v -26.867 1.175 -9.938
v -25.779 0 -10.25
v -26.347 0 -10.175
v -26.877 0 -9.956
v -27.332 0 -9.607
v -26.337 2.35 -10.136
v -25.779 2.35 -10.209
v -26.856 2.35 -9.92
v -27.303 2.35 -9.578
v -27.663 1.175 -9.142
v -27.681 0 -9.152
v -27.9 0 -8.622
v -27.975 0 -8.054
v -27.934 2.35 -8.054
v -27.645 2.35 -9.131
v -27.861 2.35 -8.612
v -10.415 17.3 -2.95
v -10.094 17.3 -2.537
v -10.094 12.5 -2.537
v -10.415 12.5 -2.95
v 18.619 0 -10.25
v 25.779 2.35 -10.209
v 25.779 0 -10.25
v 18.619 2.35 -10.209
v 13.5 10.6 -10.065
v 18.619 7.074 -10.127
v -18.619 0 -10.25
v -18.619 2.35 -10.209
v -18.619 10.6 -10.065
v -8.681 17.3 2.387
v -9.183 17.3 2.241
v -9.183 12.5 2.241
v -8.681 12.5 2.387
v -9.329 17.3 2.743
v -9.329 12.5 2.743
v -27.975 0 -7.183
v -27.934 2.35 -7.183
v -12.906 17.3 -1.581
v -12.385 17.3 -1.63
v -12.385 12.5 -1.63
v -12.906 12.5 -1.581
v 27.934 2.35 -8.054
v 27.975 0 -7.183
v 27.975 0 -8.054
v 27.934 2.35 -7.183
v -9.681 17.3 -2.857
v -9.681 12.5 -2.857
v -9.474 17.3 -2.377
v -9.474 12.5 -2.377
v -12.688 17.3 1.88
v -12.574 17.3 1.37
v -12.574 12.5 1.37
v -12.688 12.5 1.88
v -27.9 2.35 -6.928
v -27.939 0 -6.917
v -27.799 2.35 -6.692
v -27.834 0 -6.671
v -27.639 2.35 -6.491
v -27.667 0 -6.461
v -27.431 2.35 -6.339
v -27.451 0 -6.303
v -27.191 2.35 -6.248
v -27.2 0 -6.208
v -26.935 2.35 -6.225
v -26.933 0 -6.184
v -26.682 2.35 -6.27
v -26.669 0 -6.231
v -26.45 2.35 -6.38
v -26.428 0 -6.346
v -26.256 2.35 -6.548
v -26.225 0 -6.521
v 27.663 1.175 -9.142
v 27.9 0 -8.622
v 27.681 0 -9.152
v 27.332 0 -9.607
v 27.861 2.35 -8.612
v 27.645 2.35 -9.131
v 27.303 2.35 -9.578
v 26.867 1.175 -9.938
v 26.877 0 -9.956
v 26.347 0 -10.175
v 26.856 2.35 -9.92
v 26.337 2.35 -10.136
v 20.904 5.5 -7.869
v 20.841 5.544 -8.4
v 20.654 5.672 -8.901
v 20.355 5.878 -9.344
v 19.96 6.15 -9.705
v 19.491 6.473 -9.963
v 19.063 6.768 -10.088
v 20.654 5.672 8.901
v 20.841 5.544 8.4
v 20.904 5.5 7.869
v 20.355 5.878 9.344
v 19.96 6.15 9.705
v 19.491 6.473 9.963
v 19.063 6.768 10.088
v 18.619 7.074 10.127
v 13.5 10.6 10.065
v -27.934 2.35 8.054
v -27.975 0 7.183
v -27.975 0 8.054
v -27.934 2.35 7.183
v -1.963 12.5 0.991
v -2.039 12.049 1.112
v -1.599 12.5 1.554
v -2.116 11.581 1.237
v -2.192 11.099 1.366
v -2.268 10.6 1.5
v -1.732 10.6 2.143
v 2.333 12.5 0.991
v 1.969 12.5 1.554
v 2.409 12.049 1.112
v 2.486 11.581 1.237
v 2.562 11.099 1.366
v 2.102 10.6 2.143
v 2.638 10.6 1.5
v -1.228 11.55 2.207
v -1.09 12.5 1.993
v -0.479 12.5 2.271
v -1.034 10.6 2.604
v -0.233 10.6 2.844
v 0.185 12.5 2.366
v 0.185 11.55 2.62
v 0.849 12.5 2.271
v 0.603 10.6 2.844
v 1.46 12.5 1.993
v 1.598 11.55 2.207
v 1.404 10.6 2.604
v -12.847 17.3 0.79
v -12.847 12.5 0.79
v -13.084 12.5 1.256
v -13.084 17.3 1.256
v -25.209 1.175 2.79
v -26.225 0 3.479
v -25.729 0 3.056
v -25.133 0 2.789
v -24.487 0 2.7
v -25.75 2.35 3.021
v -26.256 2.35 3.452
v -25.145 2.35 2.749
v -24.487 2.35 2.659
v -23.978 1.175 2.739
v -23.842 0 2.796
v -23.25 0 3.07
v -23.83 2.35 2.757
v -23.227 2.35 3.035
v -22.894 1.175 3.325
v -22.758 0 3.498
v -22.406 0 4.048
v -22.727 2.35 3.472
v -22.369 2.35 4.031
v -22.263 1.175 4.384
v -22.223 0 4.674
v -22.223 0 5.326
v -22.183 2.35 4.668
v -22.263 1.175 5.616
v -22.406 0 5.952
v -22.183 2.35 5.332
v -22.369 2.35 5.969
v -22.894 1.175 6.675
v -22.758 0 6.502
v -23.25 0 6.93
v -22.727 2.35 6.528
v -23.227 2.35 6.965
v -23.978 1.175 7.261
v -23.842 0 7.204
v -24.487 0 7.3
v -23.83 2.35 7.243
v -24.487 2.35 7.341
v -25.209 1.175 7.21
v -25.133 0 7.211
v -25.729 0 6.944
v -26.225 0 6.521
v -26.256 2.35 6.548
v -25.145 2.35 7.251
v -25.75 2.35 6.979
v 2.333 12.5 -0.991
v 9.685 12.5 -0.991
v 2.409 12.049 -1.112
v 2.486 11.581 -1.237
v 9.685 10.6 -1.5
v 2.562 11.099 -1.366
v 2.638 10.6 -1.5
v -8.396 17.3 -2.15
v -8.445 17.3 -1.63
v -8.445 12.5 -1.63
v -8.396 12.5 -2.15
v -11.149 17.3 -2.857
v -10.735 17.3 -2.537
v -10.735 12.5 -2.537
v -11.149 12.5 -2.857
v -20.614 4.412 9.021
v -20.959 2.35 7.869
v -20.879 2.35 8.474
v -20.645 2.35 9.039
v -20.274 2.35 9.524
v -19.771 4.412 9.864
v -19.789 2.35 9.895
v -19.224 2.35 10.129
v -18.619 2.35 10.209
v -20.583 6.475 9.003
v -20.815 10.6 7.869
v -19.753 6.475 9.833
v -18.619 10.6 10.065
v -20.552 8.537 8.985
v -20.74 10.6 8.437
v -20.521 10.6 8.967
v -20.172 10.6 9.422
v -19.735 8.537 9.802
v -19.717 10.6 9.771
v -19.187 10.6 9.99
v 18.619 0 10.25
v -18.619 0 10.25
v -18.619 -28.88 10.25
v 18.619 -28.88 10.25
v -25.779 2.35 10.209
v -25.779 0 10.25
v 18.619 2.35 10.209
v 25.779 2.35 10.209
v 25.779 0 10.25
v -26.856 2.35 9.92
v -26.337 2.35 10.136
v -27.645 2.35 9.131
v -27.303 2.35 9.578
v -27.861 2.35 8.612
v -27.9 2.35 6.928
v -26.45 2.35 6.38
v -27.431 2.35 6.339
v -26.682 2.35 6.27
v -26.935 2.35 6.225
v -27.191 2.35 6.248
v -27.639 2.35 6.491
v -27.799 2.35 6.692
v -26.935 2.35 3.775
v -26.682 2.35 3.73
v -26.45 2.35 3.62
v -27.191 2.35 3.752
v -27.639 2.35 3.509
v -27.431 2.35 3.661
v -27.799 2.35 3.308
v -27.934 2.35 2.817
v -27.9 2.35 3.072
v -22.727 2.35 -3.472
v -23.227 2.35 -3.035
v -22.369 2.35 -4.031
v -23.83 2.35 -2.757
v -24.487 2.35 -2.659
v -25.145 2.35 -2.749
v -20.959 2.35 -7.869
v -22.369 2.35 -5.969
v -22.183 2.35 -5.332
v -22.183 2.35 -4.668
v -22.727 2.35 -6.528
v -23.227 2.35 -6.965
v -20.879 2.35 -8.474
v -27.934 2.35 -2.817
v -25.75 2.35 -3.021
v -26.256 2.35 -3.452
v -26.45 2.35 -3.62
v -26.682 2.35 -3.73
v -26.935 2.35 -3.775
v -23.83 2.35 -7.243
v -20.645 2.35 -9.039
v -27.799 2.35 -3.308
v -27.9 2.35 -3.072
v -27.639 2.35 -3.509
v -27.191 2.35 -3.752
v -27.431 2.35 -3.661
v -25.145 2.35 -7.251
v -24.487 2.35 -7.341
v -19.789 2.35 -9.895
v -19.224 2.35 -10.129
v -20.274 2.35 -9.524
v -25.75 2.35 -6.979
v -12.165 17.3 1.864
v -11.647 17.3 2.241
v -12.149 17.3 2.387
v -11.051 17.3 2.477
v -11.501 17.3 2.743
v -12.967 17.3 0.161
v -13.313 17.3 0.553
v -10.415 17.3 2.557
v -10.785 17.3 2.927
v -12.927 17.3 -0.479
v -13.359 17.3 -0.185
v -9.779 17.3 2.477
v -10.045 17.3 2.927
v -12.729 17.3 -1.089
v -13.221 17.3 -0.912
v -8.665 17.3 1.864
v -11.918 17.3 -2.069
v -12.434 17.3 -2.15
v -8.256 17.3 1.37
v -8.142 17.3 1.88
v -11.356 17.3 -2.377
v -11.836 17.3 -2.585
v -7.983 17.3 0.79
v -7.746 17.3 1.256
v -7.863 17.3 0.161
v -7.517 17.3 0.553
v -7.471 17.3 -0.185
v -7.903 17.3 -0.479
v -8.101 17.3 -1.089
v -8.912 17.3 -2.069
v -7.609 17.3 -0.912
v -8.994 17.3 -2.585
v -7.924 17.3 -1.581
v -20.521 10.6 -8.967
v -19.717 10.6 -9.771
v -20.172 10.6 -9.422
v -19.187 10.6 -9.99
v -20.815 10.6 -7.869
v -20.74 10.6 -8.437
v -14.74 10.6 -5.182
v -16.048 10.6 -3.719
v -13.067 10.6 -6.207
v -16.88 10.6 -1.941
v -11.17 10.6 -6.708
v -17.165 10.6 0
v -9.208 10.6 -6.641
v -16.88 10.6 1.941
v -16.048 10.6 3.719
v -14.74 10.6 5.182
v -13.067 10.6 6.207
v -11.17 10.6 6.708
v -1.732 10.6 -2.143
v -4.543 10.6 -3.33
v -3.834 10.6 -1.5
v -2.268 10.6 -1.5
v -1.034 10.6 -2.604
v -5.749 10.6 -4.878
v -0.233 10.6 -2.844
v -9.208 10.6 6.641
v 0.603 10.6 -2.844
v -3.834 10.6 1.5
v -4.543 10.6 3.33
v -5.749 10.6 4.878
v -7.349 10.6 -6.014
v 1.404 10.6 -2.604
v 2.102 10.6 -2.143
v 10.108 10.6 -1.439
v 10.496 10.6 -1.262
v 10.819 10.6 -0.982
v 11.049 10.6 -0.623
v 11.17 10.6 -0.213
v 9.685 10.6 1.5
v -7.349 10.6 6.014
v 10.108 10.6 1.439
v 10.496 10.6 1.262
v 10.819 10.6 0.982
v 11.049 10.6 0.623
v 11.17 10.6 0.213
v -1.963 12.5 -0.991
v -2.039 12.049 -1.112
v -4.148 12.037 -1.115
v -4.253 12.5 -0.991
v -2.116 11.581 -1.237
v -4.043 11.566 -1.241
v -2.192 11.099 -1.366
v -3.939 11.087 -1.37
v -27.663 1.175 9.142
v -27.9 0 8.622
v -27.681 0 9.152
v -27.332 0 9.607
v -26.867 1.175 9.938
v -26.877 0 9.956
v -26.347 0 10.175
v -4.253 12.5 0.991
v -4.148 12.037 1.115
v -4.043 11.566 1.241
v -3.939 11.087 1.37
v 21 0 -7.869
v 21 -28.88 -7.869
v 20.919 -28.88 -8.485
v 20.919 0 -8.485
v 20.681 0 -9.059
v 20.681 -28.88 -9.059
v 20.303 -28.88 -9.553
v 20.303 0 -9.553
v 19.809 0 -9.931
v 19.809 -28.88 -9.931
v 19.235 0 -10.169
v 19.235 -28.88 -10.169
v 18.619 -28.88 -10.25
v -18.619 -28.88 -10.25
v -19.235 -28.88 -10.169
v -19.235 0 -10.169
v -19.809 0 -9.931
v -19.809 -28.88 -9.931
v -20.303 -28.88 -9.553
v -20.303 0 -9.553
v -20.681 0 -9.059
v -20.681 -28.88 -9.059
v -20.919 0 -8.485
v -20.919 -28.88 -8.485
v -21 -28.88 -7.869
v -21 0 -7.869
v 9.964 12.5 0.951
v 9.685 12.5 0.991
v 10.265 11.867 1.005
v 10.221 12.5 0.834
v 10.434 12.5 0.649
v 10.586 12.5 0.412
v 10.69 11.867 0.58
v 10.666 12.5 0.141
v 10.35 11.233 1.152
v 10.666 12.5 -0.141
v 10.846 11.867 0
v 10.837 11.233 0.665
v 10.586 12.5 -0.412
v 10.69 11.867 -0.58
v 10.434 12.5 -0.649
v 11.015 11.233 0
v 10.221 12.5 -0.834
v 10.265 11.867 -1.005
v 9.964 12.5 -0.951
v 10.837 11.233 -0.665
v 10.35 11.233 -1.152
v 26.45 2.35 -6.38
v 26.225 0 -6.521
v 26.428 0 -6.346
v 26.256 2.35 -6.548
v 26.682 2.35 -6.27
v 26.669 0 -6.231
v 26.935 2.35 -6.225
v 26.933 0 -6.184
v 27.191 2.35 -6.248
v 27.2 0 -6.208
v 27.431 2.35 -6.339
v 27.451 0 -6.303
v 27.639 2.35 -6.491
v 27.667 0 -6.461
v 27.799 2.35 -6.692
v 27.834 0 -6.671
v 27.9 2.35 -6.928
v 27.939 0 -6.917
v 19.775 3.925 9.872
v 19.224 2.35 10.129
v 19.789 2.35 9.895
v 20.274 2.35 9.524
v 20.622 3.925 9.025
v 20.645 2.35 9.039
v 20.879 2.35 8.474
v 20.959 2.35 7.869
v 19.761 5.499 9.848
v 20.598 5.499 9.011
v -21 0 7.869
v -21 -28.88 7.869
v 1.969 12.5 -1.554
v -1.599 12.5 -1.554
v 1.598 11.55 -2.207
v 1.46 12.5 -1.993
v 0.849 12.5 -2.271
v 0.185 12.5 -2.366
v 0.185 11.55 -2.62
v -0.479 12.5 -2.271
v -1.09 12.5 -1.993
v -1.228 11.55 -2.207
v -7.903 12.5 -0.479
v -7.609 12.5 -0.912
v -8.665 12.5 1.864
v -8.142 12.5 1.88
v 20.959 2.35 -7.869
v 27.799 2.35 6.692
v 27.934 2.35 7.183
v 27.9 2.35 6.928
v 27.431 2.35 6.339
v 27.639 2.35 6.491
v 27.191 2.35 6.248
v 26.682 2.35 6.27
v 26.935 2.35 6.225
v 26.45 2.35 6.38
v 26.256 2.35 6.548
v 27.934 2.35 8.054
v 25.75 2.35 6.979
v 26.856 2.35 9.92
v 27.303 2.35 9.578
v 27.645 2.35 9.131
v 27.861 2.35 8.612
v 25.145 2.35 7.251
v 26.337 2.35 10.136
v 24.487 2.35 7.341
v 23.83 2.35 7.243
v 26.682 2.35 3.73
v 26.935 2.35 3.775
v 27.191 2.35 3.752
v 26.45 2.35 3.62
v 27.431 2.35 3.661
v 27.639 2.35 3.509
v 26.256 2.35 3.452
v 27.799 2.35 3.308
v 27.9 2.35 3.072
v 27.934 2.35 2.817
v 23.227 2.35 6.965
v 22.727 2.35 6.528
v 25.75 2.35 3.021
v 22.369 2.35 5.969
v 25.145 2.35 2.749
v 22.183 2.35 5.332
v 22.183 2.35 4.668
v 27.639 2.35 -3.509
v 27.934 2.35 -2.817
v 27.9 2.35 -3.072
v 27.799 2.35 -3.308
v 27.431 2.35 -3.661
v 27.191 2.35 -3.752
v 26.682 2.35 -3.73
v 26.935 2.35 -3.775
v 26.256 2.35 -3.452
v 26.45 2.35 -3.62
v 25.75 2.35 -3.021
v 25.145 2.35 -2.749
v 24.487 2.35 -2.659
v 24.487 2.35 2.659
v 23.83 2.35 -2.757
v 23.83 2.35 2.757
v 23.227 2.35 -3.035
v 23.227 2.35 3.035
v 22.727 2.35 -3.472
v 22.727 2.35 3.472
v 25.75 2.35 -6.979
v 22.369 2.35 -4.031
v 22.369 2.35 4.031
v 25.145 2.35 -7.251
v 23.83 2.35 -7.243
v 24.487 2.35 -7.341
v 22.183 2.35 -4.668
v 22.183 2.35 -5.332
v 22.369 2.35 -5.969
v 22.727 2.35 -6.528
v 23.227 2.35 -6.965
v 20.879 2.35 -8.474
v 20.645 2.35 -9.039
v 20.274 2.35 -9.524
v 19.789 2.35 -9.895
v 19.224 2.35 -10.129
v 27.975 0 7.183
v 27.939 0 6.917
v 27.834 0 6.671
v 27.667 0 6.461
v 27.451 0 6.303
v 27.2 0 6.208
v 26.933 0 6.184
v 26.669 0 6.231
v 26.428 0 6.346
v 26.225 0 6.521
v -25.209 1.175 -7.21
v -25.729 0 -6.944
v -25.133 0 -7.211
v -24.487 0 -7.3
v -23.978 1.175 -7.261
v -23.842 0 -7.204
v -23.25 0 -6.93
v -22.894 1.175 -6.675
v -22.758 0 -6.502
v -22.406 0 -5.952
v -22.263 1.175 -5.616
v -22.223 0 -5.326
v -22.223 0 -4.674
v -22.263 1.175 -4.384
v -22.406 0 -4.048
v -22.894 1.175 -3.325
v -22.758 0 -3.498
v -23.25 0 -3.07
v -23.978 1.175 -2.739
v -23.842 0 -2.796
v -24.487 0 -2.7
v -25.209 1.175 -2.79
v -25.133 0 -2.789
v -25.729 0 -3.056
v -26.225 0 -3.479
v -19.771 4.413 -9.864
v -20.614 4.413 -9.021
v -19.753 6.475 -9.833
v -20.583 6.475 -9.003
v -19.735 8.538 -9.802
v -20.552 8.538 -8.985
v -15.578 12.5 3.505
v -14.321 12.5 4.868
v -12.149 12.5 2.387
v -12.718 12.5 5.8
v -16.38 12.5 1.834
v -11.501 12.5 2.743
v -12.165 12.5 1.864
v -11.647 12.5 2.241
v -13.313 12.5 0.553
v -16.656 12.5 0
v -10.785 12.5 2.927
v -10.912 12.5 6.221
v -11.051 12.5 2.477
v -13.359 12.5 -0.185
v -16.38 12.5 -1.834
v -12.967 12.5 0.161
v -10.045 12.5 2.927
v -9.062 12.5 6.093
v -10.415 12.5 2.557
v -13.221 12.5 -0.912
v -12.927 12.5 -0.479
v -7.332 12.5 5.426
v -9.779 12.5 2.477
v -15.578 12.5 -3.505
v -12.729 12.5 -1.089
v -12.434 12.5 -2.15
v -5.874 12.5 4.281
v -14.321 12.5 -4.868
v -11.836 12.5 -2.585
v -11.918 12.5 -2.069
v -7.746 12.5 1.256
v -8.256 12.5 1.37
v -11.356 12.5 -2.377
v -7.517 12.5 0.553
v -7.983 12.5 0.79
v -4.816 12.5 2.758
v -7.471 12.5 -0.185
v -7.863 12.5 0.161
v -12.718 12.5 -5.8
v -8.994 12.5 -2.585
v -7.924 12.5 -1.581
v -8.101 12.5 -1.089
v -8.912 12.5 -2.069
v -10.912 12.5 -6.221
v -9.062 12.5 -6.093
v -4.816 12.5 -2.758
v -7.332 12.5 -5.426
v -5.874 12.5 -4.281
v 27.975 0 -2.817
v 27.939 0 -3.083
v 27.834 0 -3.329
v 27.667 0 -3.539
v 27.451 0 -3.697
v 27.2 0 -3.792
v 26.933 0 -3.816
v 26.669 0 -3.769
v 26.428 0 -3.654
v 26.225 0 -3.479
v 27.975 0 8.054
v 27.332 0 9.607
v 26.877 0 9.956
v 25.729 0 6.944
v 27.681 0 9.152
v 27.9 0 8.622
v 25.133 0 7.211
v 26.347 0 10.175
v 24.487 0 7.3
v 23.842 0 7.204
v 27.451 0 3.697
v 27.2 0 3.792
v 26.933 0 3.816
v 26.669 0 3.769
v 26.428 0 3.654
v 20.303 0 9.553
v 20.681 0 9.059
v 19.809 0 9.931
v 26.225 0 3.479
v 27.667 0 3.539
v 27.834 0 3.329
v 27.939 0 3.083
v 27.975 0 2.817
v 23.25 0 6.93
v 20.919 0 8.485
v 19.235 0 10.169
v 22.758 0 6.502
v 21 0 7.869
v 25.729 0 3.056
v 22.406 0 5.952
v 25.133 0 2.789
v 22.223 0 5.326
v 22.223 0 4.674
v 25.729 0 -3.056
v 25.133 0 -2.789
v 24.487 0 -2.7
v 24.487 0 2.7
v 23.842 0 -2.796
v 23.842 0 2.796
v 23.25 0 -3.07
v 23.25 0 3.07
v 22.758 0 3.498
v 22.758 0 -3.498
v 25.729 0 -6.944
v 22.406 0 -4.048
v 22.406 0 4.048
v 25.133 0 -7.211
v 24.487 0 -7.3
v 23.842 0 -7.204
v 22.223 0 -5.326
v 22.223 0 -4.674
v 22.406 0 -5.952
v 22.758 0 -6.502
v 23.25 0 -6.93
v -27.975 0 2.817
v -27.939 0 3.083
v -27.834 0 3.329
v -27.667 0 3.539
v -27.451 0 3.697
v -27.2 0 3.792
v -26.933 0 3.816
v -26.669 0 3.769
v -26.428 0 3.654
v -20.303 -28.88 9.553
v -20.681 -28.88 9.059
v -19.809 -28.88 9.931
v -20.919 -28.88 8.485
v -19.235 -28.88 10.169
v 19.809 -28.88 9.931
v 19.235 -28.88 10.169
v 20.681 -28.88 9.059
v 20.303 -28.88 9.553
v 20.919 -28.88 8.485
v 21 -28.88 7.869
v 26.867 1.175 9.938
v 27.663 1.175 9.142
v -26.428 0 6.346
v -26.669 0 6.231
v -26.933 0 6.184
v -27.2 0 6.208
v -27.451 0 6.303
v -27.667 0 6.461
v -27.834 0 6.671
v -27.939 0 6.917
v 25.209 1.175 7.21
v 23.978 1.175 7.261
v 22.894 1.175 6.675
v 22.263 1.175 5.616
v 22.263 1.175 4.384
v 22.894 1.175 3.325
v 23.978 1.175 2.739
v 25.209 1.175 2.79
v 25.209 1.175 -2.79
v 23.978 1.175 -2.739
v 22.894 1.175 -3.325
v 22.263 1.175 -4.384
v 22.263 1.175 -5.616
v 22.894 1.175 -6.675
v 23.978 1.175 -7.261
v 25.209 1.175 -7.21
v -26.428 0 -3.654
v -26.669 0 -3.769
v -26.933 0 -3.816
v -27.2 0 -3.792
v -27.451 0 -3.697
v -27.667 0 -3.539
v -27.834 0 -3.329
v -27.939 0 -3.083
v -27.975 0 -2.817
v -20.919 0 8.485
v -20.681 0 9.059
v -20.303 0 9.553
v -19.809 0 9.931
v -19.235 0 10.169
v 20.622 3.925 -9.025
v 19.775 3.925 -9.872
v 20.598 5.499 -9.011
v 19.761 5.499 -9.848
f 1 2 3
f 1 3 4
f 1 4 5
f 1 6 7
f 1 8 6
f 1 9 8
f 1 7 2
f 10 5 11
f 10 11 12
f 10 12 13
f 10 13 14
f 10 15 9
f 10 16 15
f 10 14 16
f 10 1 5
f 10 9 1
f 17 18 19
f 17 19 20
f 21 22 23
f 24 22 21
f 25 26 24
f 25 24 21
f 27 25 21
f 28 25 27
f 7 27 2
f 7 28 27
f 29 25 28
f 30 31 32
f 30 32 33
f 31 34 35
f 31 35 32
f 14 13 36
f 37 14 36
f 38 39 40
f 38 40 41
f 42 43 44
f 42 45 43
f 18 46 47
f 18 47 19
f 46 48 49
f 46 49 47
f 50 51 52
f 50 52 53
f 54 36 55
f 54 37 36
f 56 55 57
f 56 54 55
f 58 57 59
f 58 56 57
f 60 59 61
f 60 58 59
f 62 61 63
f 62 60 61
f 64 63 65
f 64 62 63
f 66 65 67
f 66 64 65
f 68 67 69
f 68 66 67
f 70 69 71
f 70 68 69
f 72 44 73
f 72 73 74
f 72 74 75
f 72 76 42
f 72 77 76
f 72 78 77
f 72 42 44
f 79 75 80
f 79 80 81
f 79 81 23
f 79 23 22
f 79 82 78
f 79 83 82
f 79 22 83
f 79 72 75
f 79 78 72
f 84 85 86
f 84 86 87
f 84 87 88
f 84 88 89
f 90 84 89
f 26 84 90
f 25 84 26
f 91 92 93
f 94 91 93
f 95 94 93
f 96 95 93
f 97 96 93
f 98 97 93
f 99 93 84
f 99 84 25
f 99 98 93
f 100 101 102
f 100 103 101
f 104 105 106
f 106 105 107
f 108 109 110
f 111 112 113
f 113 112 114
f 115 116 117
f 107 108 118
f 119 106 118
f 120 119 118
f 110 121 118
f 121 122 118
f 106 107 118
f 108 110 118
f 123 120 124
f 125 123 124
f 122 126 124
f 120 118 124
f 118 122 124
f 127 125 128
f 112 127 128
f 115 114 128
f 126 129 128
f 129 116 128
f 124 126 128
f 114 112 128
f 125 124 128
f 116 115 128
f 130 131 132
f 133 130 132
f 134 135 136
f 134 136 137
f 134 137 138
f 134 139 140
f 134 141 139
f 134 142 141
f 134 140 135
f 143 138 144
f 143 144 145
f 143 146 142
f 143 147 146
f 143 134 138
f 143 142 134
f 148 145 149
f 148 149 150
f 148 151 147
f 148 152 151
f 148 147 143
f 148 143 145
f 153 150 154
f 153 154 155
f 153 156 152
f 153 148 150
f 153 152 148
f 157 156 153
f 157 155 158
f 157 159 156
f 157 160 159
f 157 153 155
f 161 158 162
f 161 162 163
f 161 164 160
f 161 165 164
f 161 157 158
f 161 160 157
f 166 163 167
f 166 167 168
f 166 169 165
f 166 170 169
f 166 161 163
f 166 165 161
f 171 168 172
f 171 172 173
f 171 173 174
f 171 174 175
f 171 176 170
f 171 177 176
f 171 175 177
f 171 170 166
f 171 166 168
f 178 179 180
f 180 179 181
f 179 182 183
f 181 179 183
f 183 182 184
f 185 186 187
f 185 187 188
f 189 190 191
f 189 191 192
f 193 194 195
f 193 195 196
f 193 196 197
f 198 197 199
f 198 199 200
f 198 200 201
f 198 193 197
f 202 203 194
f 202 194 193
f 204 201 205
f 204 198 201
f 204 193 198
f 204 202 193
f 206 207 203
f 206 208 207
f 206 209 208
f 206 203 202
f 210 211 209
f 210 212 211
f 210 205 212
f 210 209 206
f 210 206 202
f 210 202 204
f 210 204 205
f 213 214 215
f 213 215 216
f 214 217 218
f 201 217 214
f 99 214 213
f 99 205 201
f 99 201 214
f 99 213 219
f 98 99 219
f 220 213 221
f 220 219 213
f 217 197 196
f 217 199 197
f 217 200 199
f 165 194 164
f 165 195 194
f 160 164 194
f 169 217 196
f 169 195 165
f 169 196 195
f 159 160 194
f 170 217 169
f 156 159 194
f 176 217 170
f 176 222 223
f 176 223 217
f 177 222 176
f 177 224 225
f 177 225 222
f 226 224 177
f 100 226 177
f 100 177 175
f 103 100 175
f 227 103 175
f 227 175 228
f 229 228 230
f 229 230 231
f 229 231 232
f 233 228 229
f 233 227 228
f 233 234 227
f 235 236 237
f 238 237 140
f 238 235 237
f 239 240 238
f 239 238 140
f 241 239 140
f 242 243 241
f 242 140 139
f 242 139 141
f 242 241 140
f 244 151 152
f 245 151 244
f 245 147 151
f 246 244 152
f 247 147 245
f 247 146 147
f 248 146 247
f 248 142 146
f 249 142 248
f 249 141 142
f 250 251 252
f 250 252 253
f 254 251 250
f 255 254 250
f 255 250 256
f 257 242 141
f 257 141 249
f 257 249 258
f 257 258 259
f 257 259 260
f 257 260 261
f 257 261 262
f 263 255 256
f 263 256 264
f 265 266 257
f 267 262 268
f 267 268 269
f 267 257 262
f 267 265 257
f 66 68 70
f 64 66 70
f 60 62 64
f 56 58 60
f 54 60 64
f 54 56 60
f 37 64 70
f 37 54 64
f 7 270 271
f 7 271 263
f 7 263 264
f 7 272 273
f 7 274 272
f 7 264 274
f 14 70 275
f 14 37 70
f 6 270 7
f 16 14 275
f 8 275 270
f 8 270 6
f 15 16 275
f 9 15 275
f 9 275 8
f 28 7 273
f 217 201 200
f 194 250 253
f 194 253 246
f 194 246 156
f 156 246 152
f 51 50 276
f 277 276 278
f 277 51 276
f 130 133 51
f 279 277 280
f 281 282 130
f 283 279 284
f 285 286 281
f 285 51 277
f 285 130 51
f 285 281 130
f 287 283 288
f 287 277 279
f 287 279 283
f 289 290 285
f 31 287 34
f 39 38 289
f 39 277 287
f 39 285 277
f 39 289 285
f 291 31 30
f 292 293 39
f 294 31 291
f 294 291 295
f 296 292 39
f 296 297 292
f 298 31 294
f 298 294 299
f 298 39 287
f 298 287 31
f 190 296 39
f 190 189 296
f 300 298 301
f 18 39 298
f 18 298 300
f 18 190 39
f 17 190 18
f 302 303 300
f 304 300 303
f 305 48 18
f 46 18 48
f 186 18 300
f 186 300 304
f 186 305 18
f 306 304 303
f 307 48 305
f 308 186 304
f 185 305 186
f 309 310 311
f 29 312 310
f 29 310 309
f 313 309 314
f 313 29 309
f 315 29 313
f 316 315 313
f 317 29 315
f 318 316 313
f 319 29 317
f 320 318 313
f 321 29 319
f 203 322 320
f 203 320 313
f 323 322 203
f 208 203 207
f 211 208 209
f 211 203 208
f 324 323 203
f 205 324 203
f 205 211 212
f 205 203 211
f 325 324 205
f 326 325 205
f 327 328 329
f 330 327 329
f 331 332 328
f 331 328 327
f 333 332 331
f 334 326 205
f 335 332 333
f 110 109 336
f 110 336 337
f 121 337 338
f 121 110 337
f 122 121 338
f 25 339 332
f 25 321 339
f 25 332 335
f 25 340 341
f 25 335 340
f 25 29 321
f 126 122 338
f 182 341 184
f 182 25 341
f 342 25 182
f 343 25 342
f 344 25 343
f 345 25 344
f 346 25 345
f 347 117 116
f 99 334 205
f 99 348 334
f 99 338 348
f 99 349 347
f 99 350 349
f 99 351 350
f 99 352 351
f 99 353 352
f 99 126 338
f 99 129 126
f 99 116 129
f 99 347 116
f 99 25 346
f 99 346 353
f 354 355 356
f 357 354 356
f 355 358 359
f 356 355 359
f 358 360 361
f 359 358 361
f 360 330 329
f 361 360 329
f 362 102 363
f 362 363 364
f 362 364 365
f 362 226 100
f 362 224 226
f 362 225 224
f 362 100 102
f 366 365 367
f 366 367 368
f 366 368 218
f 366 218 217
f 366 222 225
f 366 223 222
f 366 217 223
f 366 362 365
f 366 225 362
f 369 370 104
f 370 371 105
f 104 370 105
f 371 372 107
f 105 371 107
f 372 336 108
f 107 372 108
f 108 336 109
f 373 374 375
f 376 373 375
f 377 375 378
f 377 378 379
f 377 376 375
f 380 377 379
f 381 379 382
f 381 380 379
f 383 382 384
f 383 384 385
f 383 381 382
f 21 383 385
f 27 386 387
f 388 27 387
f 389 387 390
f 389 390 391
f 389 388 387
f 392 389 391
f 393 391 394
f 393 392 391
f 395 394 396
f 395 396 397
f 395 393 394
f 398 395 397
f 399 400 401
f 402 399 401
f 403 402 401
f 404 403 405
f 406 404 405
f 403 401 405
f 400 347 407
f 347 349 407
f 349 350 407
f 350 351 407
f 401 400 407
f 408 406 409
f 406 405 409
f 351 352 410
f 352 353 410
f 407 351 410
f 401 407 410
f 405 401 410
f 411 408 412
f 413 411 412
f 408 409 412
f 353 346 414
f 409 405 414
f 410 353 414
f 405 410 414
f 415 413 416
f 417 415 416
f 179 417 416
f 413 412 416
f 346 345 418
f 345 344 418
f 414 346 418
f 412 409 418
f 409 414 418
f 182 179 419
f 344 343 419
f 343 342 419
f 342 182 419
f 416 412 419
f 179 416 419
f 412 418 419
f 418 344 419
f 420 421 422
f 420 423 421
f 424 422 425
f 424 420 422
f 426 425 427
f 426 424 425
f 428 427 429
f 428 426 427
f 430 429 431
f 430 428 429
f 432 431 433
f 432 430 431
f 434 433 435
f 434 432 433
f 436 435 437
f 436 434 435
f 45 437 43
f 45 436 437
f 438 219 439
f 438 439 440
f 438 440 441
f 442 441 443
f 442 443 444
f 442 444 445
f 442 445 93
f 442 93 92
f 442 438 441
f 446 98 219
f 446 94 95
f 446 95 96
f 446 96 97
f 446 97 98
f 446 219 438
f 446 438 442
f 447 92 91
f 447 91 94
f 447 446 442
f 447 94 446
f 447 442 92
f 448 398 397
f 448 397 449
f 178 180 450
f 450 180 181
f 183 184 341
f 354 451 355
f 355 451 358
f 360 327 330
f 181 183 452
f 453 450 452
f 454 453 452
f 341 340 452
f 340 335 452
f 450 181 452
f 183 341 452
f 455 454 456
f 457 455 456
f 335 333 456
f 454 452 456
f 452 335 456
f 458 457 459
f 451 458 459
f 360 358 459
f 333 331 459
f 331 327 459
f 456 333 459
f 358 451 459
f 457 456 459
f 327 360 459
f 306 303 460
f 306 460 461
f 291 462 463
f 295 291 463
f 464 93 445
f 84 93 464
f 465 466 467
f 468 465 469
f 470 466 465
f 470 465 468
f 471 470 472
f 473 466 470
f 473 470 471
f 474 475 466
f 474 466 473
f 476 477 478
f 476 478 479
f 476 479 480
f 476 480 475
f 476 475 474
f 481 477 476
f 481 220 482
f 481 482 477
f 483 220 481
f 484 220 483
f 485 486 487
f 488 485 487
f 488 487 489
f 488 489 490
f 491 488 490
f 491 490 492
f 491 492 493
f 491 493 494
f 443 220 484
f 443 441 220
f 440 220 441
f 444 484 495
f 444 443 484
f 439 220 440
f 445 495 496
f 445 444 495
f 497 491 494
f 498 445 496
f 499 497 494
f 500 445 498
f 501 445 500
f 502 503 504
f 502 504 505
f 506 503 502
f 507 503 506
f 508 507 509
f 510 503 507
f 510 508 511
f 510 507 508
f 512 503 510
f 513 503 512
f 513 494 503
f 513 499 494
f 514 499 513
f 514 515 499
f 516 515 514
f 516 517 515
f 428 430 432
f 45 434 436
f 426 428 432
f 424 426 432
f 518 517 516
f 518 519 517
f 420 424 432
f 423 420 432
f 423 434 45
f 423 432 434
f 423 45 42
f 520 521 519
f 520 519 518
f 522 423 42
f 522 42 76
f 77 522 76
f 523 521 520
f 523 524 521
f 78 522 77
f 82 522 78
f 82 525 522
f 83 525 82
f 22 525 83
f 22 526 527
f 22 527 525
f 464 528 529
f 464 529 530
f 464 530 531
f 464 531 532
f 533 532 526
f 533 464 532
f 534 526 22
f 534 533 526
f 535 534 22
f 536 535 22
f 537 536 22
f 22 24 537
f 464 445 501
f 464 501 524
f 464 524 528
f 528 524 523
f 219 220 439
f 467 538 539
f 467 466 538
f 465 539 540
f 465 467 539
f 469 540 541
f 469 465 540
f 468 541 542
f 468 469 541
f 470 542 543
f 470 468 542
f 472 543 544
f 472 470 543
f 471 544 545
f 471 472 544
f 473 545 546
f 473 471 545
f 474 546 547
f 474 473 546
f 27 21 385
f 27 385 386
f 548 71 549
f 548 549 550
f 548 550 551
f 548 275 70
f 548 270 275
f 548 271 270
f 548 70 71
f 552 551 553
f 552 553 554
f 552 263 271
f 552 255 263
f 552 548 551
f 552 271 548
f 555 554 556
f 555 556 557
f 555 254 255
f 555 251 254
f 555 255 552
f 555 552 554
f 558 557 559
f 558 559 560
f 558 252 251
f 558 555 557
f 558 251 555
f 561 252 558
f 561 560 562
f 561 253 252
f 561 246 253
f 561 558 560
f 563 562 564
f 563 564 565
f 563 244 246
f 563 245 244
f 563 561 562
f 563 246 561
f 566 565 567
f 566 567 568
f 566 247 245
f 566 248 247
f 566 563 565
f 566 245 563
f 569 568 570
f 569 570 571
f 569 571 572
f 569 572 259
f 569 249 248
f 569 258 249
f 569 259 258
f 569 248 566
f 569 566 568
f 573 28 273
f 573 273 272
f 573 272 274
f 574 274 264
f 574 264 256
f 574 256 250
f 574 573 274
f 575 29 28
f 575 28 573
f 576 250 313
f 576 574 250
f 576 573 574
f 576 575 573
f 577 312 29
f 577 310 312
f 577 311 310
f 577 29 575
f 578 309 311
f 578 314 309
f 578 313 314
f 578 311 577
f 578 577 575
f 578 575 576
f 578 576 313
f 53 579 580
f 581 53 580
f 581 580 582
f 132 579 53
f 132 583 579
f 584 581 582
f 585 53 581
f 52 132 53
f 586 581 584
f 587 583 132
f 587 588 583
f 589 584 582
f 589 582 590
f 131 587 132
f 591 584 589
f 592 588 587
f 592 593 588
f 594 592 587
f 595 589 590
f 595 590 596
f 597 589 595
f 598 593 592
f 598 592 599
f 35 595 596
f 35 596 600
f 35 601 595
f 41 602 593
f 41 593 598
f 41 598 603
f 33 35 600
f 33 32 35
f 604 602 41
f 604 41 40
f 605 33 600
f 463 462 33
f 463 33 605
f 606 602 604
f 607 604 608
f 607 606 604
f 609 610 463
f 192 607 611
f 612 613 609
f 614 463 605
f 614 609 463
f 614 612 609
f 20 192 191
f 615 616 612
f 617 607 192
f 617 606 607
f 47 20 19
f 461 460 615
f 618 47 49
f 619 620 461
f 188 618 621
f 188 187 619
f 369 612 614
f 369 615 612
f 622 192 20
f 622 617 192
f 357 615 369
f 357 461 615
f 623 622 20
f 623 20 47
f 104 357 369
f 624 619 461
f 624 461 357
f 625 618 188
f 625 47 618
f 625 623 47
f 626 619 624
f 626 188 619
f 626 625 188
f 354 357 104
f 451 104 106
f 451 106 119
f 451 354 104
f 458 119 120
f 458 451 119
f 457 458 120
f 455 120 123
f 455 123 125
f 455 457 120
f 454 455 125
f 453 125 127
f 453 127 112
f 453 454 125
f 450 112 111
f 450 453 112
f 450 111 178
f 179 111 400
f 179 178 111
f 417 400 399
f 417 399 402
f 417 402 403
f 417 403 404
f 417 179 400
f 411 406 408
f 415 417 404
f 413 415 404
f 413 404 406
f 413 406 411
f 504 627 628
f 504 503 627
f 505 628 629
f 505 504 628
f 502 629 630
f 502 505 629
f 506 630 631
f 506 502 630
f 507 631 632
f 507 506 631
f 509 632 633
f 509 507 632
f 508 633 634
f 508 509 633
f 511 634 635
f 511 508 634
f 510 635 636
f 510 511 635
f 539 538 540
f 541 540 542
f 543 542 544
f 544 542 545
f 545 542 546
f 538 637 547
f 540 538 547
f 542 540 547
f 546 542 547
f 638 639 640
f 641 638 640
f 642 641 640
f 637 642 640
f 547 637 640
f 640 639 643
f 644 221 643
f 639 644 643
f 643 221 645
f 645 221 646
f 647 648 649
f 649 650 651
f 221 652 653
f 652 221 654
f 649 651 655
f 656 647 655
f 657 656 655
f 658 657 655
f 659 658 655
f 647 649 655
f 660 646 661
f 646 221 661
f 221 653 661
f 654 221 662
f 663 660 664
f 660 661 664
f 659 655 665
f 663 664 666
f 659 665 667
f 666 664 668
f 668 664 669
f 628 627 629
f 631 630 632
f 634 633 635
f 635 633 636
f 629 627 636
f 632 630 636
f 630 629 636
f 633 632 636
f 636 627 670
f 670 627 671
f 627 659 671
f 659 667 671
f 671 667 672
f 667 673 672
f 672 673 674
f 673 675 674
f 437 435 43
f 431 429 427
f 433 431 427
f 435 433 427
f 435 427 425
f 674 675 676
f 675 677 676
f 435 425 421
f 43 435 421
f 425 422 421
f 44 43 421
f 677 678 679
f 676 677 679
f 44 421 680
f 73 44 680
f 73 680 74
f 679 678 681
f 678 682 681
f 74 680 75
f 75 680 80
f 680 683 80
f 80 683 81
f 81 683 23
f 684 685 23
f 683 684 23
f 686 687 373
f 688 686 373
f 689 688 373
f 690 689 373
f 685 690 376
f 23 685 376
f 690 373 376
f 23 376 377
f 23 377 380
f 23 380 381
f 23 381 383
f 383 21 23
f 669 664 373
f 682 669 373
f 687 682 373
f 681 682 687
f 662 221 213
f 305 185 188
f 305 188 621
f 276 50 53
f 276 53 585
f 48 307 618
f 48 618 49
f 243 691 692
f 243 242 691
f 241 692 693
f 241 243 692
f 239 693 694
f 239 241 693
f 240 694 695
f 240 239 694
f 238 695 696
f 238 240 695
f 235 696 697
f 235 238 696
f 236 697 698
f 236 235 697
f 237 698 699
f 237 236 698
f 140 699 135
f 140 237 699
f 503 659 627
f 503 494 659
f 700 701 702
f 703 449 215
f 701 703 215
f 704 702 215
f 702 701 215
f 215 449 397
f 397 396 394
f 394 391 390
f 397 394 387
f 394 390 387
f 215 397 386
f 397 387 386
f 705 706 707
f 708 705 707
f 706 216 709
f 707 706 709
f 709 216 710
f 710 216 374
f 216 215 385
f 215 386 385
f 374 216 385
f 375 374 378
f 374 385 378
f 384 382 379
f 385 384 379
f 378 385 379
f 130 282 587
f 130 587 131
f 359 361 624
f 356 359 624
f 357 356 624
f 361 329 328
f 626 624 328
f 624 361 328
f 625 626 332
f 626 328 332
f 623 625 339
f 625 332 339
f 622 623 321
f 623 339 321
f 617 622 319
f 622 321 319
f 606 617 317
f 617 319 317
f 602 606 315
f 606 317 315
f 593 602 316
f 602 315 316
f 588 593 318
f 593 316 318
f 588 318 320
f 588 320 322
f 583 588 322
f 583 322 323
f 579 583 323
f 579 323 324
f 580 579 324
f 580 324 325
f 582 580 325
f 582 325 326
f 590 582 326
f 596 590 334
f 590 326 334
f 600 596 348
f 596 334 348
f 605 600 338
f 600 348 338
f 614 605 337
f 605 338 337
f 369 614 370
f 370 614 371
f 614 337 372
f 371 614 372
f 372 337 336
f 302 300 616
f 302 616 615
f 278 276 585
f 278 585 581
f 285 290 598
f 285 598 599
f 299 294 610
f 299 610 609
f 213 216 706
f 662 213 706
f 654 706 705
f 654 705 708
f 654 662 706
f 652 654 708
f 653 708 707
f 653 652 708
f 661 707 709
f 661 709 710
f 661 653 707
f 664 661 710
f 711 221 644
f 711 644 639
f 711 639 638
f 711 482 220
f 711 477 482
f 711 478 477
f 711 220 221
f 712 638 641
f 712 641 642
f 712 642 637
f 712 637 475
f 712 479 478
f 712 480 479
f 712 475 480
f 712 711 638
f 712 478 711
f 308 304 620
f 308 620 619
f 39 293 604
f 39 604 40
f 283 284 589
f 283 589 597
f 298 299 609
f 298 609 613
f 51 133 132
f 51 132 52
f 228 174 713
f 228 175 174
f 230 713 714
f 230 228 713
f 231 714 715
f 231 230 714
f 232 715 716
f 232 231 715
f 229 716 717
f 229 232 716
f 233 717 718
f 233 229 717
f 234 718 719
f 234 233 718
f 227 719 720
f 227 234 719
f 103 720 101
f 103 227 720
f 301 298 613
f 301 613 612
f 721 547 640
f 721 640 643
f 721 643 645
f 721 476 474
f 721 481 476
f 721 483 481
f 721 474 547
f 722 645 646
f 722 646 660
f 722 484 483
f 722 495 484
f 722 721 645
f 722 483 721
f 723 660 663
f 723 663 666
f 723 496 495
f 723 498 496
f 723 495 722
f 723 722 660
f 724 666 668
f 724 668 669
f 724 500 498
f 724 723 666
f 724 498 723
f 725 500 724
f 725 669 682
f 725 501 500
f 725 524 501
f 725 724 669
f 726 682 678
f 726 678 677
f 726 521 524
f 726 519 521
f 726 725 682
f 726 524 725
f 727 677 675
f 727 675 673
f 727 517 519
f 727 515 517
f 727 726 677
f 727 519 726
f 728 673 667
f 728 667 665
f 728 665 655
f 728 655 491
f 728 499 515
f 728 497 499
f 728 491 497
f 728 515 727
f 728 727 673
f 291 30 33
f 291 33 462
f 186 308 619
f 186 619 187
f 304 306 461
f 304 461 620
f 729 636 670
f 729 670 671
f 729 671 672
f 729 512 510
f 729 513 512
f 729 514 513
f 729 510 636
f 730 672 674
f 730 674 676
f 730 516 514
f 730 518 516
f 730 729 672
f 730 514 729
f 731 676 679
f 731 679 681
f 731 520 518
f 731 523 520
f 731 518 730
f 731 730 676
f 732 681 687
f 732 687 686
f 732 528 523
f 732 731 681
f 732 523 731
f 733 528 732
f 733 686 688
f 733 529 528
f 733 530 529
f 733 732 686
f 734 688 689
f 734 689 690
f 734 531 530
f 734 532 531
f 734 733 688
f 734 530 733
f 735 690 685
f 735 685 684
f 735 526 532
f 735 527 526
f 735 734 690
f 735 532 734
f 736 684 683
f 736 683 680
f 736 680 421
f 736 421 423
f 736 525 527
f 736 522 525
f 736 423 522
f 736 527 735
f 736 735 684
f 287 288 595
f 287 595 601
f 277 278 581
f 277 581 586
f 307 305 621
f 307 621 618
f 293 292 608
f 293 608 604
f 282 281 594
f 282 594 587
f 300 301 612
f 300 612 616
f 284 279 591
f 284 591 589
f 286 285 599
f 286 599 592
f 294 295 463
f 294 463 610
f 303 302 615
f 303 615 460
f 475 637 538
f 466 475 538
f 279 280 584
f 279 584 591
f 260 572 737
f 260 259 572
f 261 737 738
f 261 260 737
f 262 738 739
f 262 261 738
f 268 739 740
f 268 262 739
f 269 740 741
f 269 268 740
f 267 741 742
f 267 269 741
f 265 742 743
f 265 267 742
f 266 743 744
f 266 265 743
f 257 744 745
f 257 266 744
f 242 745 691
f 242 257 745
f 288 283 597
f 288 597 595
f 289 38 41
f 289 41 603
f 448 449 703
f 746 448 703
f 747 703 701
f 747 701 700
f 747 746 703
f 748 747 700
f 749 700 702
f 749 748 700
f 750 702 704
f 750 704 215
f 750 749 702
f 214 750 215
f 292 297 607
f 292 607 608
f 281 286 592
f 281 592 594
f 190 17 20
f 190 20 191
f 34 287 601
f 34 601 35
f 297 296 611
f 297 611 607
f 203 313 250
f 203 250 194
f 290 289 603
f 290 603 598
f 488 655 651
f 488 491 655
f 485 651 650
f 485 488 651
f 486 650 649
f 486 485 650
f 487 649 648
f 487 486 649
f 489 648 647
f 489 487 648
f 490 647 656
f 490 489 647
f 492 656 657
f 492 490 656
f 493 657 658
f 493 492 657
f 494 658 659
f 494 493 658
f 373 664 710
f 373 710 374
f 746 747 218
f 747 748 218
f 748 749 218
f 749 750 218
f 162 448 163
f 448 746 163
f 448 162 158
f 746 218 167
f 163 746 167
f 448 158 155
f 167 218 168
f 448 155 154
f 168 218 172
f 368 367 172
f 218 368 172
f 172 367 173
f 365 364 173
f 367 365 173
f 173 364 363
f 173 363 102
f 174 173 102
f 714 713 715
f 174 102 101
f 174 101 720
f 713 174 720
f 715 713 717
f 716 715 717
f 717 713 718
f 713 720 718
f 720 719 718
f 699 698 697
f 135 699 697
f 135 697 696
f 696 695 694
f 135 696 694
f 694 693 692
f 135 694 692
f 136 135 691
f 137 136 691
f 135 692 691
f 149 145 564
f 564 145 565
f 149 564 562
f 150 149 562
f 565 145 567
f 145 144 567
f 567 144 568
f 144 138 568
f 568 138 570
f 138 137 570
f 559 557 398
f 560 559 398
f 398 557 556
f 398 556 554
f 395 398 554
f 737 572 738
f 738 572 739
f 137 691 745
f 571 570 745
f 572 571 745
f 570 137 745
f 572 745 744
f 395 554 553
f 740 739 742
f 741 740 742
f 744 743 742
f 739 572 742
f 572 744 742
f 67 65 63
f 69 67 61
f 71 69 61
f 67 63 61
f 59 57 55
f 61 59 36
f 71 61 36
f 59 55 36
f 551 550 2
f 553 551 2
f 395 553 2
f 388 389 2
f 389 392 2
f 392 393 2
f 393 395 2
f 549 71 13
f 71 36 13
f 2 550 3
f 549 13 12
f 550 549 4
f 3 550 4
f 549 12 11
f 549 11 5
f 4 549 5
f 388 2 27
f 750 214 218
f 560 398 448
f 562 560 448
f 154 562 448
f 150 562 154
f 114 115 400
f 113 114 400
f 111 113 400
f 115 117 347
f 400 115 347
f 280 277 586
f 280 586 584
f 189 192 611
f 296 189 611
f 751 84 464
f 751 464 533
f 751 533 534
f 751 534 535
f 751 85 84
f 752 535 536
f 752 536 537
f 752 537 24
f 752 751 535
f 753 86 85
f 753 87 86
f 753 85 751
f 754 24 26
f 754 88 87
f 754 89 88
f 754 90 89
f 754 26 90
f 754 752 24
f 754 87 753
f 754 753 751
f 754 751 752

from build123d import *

# Parameters (mm, degrees)
BOSS_EXTRUDE1_DEPTH     = 28.88
BOSS_EXTRUDE2_DEPTH     = 10.6
BOSS_EXTRUDE2_TAPER     = 1
BOSS_EXTRUDE3_DEPTH     = 2.35
BOSS_EXTRUDE3_TAPER     = 1
CUT_EXTRUDE1_DEPTH      = 42.493584235
CUT_EXTRUDE1_DEPTH_BACK = 42.493584235
BOSS_EXTRUDE4_DEPTH     = 1.9
BOSS_EXTRUDE4_DRAFT     = 15
SKETCH5_R               = 2.95
BOSS_EXTRUDE5_DEPTH     = 4.8
SKETCH6_OUTSIDE_W       = 73.028
SKETCH6_OUTSIDE_H       = 37.578
CUT_EXTRUDE2_DEPTH      = 4.8


with BuildPart() as part:
    # Sketch1 → Boss-Extrude1 (new body)
    with BuildSketch(Plane(origin=(0, 0, 0), x_dir=(1, 0, 0), z_dir=(0, 1, 0))):
        with BuildLine():
            Line((-18.61875, -10.25), (18.61875, -10.25))
            ThreePointArc((18.61875, -10.25), (20.302548023, -9.552548023), (21, -7.86875))
            Line((21, -7.86875), (21, 7.86875))
            ThreePointArc((21, 7.86875), (20.302548023, 9.552548023), (18.61875, 10.25))
            Line((18.61875, 10.25), (-18.61875, 10.25))
            ThreePointArc((-18.61875, 10.25), (-20.302548023, 9.552548023), (-21, 7.86875))
            Line((-21, 7.86875), (-21, -7.86875))
            ThreePointArc((-21, -7.86875), (-20.302548023, -9.552548023), (-18.61875, -10.25))
        make_face()
    extrude(amount=-BOSS_EXTRUDE1_DEPTH)

    # Sketch1<2> → Boss-Extrude2 (add)
    with BuildSketch(Plane(origin=(0, 0, 0), x_dir=(1, 0, 0), z_dir=(0, 1, 0))):
        with BuildLine():
            Line((-18.61875, -10.25), (18.61875, -10.25))
            ThreePointArc((18.61875, -10.25), (20.302548023, -9.552548023), (21, -7.86875))
            Line((21, -7.86875), (21, 7.86875))
            ThreePointArc((21, 7.86875), (20.302548023, 9.552548023), (18.61875, 10.25))
            Line((18.61875, 10.25), (-18.61875, 10.25))
            ThreePointArc((-18.61875, 10.25), (-20.302548023, 9.552548023), (-21, 7.86875))
            Line((-21, 7.86875), (-21, -7.86875))
            ThreePointArc((-21, -7.86875), (-20.302548023, -9.552548023), (-18.61875, -10.25))
        make_face()
    extrude(amount=BOSS_EXTRUDE2_DEPTH, taper=BOSS_EXTRUDE2_TAPER)

    # Sketch2 → Boss-Extrude3 (add)
    with BuildSketch(Plane(origin=(0, 0, 0), x_dir=(1, 0, 0), z_dir=(0, 1, 0))):
        with BuildLine():
            ThreePointArc((-25.778773688, 10.25), (-27.331740206, 9.606740206), (-27.975, 8.053773688))
            Line((-27.975, 8.053773688), (-27.975, 7.182744832))
            ThreePointArc((-27.975, 7.182744832), (-27.328553391, 6.247330485), (-26.225, 6.521307004))
            ThreePointArc((-26.225, 6.521307004), (-22.2, 5), (-26.225, 3.478692996))
            ThreePointArc((-26.225, 3.478692996), (-27.328553391, 3.752669515), (-27.975, 2.817255168))
            Line((-27.975, 2.817255168), (-27.975, -2.817255168))
            ThreePointArc((-27.975, -2.817255168), (-27.328553391, -3.752669515), (-26.225, -3.478692996))
            ThreePointArc((-26.225, -3.478692996), (-22.2, -5), (-26.225, -6.521307004))
            ThreePointArc((-26.225, -6.521307004), (-27.328553391, -6.247330485), (-27.975, -7.182744832))
            Line((-27.975, -7.182744832), (-27.975, -8.053773688))
            ThreePointArc((-27.975, -8.053773688), (-27.331740206, -9.606740206), (-25.778773688, -10.25))
            Line((-25.778773688, -10.25), (25.778773688, -10.25))
            ThreePointArc((25.778773688, -10.25), (27.331740206, -9.606740206), (27.975, -8.053773688))
            Line((27.975, -8.053773688), (27.975, -7.182744832))
            ThreePointArc((27.975, -7.182744832), (27.328553391, -6.247330485), (26.225, -6.521307004))
            ThreePointArc((26.225, -6.521307004), (22.2, -5), (26.225, -3.478692996))
            ThreePointArc((26.225, -3.478692996), (27.328553391, -3.752669515), (27.975, -2.817255168))
            Line((27.975, -2.817255168), (27.975, 2.817255168))
            ThreePointArc((27.975, 2.817255168), (27.328553391, 3.752669515), (26.225, 3.478692996))
            ThreePointArc((26.225, 3.478692996), (22.2, 5), (26.225, 6.521307004))
            ThreePointArc((26.225, 6.521307004), (27.328553391, 6.247330485), (27.975, 7.182744832))
            Line((27.975, 7.182744832), (27.975, 8.053773688))
            ThreePointArc((27.975, 8.053773688), (27.331740206, 9.606740206), (25.778773688, 10.25))
            Line((25.778773688, 10.25), (-25.778773688, 10.25))
        make_face()
    extrude(amount=BOSS_EXTRUDE3_DEPTH, taper=BOSS_EXTRUDE3_TAPER)

    # Sketch3 → Cut-Extrude1 (cut, two sides: drawn at the far end of the back side and taken through both)
    with BuildSketch(Plane.XY.offset(-CUT_EXTRUDE1_DEPTH_BACK)):
        Polygon((20.903997143, 5.5), (13.5, 10.6), (20.814976312, 10.6), align=None)
    extrude(amount=CUT_EXTRUDE1_DEPTH + CUT_EXTRUDE1_DEPTH_BACK, mode=Mode.SUBTRACT)


with BuildPart() as boss_extrude4_tool:
    # Sketch4 → Boss-Extrude4 (with draft: the straight prism first)
    with BuildSketch(Plane(origin=(0, 10.6, 0), x_dir=(1, 0, 0), z_dir=(0, 1, 0))):
        with BuildLine():
            Line((-3.833753021, -1.5), (-2.267653421, -1.5))
            ThreePointArc((-2.267653421, -1.5), (0.185023688, -2.875), (2.637700797, -1.5))
            Line((2.637700797, -1.5), (9.685023688, -1.5))
            ThreePointArc((9.685023688, -1.5), (11.185023688, 0), (9.685023688, 1.5))
            Line((9.685023688, 1.5), (2.637700797, 1.5))
            ThreePointArc((2.637700797, 1.5), (0.185023688, 2.875), (-2.267653421, 1.5))
            Line((-2.267653421, 1.5), (-3.833753021, 1.5))
            ThreePointArc((-3.833753021, 1.5), (-17.164976312, 0), (-3.833753021, -1.5))
        make_face()
    extrude(amount=BOSS_EXTRUDE4_DEPTH)
    # Boss-Extrude4: the draft: its side faces are tilted about the plane it starts from
    boss_extrude4_sides = [boss_extrude4_tool.faces().sort_by_distance(p)[0] for p in [
        (-3.050703221, 11.55, 1.5),
        (0.185023688, 11.55, 2.875),
        (6.161362243, 11.55, 1.5),
        (11.185023688, 11.55, 0),
        (6.161362243, 11.55, -1.5),
        (0.185023688, 11.55, -2.875),
        (-3.050703221, 11.55, -1.5),
        (-17.164976312, 11.55, 0),
    ]]
    draft(boss_extrude4_sides, Plane(origin=(0, 10.6, 0), x_dir=(1, 0, 0), z_dir=(0, 1, 0)), BOSS_EXTRUDE4_DRAFT)


with BuildPart() as part_1:
    add(part.part)

    # Boss-Extrude4: add boss_extrude4_tool
    add(boss_extrude4_tool.part)

    # Sketch5 → Boss-Extrude5 (add)
    with BuildSketch(Plane(origin=(0, 12.5, 0), x_dir=(1, 0, 0), z_dir=(0, 1, 0))):
        with Locations((-10.414976312, 0)):
            Circle(SKETCH5_R)
    extrude(amount=BOSS_EXTRUDE5_DEPTH)

    # Sketch6 outside → Cut-Extrude2 (cut)
    with BuildSketch(Plane(origin=(0, 12.5, 0), x_dir=(1, 0, 0), z_dir=(0, 1, 0))):
        Rectangle(SKETCH6_OUTSIDE_W, SKETCH6_OUTSIDE_H)
        Polygon((-9.183129599, -2.240720851), (-8.681009817, -2.386600133), (-8.664585713, -1.863976666), (-8.141962246, -1.88040077), (-8.256025306, -1.370111971), (-7.745736507, -1.25604891), (-7.983119731, -0.790158102), (-7.517228922, -0.552774878), (-7.863016648, -0.160555693), (-7.470797463, 0.185232033), (-7.903262576, 0.47913502), (-7.609359589, 0.911600133), (-8.101328716, 1.088719918), (-7.924208932, 1.580689045), (-8.444769843, 1.629896539), (-8.395562349, 2.150457451), (-8.912006289, 2.068660767), (-8.993802973, 2.585104706), (-9.473679868, 2.37744343), (-9.681341145, 2.857320325), (-10.094498566, 2.536842579), (-10.414976312, 2.95), (-10.735454058, 2.536842579), (-11.148611479, 2.857320325), (-11.356272755, 2.37744343), (-11.83614965, 2.585104706), (-11.917946335, 2.068660767), (-12.434390274, 2.150457451), (-12.38518278, 1.629896539), (-12.905743692, 1.580689045), (-12.728623908, 1.088719918), (-13.220593035, 0.911600133), (-12.926690047, 0.47913502), (-13.359155161, 0.185232033), (-12.966935976, -0.160555693), (-13.312723701, -0.552774878), (-12.846832893, -0.790158102), (-13.084216117, -1.25604891), (-12.573927317, -1.370111971), (-12.687990378, -1.88040077), (-12.16536691, -1.863976666), (-12.148942806, -2.386600133), (-11.646823024, -2.240720851), (-11.500943742, -2.742840633), (-11.050877679, -2.476672305), (-10.784709351, -2.926738369), (-10.414976312, -2.55700533), (-10.045243273, -2.926738369), (-9.779074945, -2.476672305), (-9.329008881, -2.742840633), align=None, mode=Mode.SUBTRACT)
    extrude(amount=CUT_EXTRUDE2_DEPTH, mode=Mode.SUBTRACT)


solid = part_1.part
